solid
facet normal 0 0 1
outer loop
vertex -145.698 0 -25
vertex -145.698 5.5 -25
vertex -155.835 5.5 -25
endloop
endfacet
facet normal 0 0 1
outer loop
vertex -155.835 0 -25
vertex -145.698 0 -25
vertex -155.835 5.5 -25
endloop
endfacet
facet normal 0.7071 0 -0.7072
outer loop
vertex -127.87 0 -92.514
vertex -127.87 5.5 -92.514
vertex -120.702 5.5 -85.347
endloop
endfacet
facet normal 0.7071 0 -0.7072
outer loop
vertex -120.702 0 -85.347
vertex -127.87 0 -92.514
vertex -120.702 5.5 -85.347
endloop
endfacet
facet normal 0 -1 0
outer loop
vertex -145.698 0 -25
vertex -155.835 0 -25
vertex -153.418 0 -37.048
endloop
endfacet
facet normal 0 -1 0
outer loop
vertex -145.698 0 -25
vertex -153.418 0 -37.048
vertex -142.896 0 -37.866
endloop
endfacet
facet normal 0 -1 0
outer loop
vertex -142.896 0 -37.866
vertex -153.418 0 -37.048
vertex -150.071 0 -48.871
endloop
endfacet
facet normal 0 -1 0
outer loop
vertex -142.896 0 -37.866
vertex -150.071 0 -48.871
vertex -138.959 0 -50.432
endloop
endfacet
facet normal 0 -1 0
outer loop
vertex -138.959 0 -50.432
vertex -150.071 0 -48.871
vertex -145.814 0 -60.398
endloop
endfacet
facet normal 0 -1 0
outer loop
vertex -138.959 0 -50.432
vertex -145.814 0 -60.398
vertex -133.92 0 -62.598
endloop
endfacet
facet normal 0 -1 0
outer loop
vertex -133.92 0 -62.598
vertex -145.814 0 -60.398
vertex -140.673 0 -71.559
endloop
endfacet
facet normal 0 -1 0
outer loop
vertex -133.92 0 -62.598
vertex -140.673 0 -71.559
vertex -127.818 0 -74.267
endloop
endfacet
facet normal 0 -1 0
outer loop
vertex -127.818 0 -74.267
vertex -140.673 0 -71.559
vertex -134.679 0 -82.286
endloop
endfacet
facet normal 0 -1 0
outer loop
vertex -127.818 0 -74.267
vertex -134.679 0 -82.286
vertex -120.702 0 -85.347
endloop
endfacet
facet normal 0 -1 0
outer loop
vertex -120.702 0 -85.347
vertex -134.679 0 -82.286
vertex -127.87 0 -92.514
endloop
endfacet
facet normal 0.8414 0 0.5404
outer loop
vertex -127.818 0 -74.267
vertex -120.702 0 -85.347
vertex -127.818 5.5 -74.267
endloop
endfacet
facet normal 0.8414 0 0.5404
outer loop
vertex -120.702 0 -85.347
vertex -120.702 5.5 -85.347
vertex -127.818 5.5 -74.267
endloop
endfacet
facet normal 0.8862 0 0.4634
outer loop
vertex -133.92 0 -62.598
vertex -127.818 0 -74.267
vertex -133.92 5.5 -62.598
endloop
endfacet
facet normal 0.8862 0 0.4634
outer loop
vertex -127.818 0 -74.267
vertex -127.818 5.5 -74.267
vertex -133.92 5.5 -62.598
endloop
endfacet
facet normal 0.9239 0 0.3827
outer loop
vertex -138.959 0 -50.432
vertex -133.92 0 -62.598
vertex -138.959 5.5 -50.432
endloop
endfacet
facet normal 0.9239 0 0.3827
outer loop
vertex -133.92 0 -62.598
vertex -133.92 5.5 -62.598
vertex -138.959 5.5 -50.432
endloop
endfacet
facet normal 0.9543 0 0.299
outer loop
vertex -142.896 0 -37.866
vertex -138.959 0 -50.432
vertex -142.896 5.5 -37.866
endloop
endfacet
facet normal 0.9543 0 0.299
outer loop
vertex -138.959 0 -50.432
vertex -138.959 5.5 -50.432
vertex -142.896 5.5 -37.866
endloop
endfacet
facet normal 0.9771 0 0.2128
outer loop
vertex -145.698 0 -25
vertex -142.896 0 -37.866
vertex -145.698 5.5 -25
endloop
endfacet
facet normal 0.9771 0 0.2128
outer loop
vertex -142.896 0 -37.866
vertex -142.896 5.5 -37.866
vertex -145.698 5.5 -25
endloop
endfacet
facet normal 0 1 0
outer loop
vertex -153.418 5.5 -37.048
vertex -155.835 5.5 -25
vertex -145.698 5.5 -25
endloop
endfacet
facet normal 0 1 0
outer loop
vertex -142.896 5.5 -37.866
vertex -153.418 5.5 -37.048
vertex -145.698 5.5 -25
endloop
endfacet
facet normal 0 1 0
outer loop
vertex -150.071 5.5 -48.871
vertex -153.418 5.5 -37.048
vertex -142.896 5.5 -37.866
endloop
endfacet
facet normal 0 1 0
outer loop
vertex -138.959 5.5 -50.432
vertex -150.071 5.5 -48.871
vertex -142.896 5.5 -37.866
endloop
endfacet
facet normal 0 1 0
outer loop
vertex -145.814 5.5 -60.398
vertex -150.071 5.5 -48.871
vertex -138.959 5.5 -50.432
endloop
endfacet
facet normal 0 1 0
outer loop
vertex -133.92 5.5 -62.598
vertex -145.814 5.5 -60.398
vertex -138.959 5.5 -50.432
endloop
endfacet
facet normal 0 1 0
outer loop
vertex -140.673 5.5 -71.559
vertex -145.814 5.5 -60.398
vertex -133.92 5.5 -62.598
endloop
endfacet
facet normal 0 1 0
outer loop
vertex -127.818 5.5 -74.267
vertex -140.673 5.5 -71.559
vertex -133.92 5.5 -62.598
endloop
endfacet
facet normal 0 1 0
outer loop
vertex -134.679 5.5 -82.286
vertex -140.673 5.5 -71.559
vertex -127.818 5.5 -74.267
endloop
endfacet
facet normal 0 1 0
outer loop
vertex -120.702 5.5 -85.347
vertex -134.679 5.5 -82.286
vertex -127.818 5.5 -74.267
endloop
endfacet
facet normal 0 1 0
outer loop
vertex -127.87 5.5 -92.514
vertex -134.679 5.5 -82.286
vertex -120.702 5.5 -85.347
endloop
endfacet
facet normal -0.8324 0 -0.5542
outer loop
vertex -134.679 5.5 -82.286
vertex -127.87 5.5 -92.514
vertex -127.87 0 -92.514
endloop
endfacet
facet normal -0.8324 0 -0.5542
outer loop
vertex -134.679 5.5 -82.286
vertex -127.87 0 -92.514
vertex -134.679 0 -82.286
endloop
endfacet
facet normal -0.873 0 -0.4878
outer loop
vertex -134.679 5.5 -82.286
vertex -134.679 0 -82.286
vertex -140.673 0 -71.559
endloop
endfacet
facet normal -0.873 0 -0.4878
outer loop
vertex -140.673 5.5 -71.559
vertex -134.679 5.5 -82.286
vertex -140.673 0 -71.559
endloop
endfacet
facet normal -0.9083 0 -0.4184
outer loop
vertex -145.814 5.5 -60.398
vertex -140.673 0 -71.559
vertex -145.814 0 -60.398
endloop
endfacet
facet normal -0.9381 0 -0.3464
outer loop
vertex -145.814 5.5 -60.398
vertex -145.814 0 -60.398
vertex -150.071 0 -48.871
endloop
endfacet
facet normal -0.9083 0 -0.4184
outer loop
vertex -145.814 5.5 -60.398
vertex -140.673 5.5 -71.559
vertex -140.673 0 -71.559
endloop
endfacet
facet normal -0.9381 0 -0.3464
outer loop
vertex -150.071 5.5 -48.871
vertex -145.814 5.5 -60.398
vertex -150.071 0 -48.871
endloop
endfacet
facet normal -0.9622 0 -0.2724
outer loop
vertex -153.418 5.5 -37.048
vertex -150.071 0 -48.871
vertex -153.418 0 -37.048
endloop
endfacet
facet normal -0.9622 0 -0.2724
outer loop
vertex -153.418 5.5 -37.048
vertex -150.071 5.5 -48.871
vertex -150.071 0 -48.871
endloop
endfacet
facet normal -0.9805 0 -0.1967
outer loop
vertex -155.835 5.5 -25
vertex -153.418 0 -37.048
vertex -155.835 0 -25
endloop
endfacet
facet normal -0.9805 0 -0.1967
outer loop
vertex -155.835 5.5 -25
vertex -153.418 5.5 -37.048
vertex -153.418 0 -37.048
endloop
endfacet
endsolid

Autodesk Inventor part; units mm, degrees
ref_plane "YZ Plane" through (0, 0, 0) normal (1, 0, 0) x (0, 1, 0)
ref_plane "XZ Plane" through (0, 0, 0) normal (0, 1, 0) x (-1, 0, 0)
ref_plane "XY Plane" through (0, 0, 0) normal (0, 0, 1) x (1, 0, 0)
sketch "スケッチ1" plane through (0, 0, 0) normal (0, 1, 0) x (-1, 0, 0)
  circle A0 centre (0, 0) radius 178.1675
  circle A1 centre (0, 0) radius 157.8276
  line L0 (168.1877, 0) -> (166.7488, -21.9529)
  line L1 (168.1877, 0) -> (130.1721, 2.4917) construction
  line L2 (249.4344, 0) -> (-249.4344, 0) projected
  line L3 (166.7488, -21.9529) -> (156.7702, -21.2989)
  line L4 (156.7702, -21.2989) -> (158.2091, 0.654) construction
  line L5 (158.2091, 0.654) -> (168.1877, 0)
  line L6 (157.4896, -10.3224) -> (0, 0)
  line L7 (166.7488, -21.9529) -> (162.4568, -43.5302)
  line L8 (162.4568, -43.5302) -> (152.649, -41.5793) construction
  line L9 (152.649, -41.5793) -> (156.9409, -20.002) construction
  line L10 (156.9409, -20.002) -> (166.7488, -21.9529) construction
  line L11 (162.4568, -43.5302) -> (155.3851, -64.3626)
  line L12 (155.3851, -64.3626) -> (145.9158, -61.1482) construction
  line L13 (145.9158, -61.1482) -> (152.9875, -40.3158) construction
  line L14 (152.9875, -40.3158) -> (162.4568, -43.5302) construction
  line L15 (155.3851, -64.3626) -> (145.6548, -84.0938)
  line L16 (145.6548, -84.0938) -> (136.6861, -79.6709) construction
  line L17 (136.6861, -79.6709) -> (146.4164, -59.9397) construction
  line L18 (146.4164, -59.9397) -> (155.3851, -64.3626) construction
  line L19 (0, 0) -> (111.6009, -111.6009)
  line L20 (145.6548, -84.0938) -> (137.3401, -78.5381) construction
  line L21 (137.3401, -78.5381) -> (125.1176, -96.8305) construction
  line L22 (125.1176, -96.8305) -> (133.4323, -102.3862) construction
  line L23 (133.4323, -102.3862) -> (145.6548, -84.0938)
  line L24 (133.4323, -102.3862) -> (125.9139, -95.7927) construction
  line L25 (125.9139, -95.7927) -> (111.4082, -112.3332) construction
  line L26 (111.4082, -112.3332) -> (118.9266, -118.9266)
  line L27 (118.9266, -118.9266) -> (133.4323, -102.3862)
  line L28 (111.6009, -111.6009) -> (118.9266, -118.9266)
  line L29 (166.7488, -21.9529) -> (176.7274, -22.6069) construction
  line L30 (118.9266, -118.9266) -> (125.9834, -125.9834)
  point P0 (154.795, -30.7906)
  point P1 (149.4517, -50.732)
  point P2 (141.5512, -69.8053)
  point P3 (131.2288, -87.6843)
  point P4 (118.661, -104.0629)
  point P5 (157.8276, 0)
  point P6 (178.1675, 0)
  dimension "d0" = 22
  dimension "d1" = 10
  dimension "d2" = 45
  dimension "d4" = 315.6551
extrude "押し出し1" add sketch "スケッチ1" along normal blind 5.5 contours L30 L27 L23 L15 L11 L7 L0 L2 A0 | L28 A1 L2 L0 L7 L11 L15 L23 L27
sketch "スケッチ2" plane through (0, 5.5, 0) normal (0, 1, 0) x (1, 0, 0)
  circle A0 centre (0, 0) radius 309.8276
  line L0 (-168.1877, 0) -> (-166.7488, 21.9529) projected
  line L1 (-166.7488, 21.9529) -> (-162.4568, 43.5302) projected
  line L2 (-162.4568, 43.5302) -> (-155.3851, 64.3626) projected
  line L3 (-155.3851, 64.3626) -> (-145.6548, 84.0938) projected
  line L4 (-133.4323, 102.3862) -> (-145.6548, 84.0938) projected
  line L5 (-118.9266, 118.9266) -> (-133.4323, 102.3862) projected
  line L6 (-167.4682, 10.9764) -> (-166.0294, 32.9293)
  line L7 (-166.0294, 32.9293) -> (-275.7938, 40.1237)
  line L8 (-275.7938, 40.1237) -> (-277.2327, 18.1708)
  line L9 (-277.2327, 18.1708) -> (-167.4682, 10.9764)
  line L10 (-164.6028, 32.7415) -> (-160.3108, 54.3188)
  line L11 (-160.3108, 54.3188) -> (-268.1972, 75.7787)
  line L12 (-268.1972, 75.7787) -> (-272.4892, 54.2015)
  line L13 (-272.4892, 54.2015) -> (-164.6028, 32.7415)
  circle A1 centre (-166.7488, 21.9529) radius 11
  circle A2 centre (-162.4568, 43.5302) radius 11
  line L14 (-158.921, 53.9464) -> (-151.8493, 74.7789)
  line L15 (-151.8493, 74.7789) -> (-256.0116, 110.1372)
  line L16 (-256.0116, 110.1372) -> (-263.0833, 89.3047)
  line L17 (-263.0833, 89.3047) -> (-158.921, 53.9464)
  circle A3 centre (-155.3851, 64.3626) radius 11
  arc A4 (-275.7591, 62.4834) -> (-281.3553, 41.7349) centre (-166.7488, 21.9529) ccw
  line L18 (-178.1663, 0.654) -> (-158.2091, -0.654)
  line L19 (-158.2091, -0.654) -> (-156.7702, 21.2989)
  line L20 (-156.7702, 21.2989) -> (-176.7274, 22.6069)
  line L21 (-176.7274, 22.6069) -> (-178.1663, 0.654)
  line L22 (-177.4468, 11.6305) -> (-275.7938, 40.1237)
  line L23 (-176.7274, 22.6069) -> (-176.008, 33.5834)
  line L24 (-176.008, 33.5834) -> (-275.7591, 62.4834)
  line L25 (-275.7938, 40.1237) -> (-281.3553, 41.7349)
  circle A5 centre (0, 0) radius 137.8276
  line L26 (0, 0) -> (-219.0812, 219.0812)
  line L27 (-111.6009, 111.6009) -> (-125.9834, 125.9834) projected
  line L28 (-433.7586, 0) -> (433.7586, 0) projected
  circle A6 centre (0, 0) radius 279.8276 construction
  arc A7 (-111.6009, 111.6009) -> (-157.8276, 0) centre (0, 0) ccw projected
  point P0 (-158.1662, 0)
  point P1 (-137.8276, 0)
  point P2 (-97.4588, 97.4588)
  point P3 (-309.8276, 0)
  dimension "d7" = 22
  dimension "d10" = 20
  dimension "d11" = 100
  dimension "d12" = 30
  dimension "d14" = 20
  dimension "d17" = 122
extrude "押し出し2" add sketch "スケッチ2" against normal blind 5.5 contours L26 L5 L4 L3 A3 L15 L16 L17 A2 L11 L12 L24 A4 L25 L8 L9 L21 L18 L28 A0 | L18 L21 L9 L0 | L0 A1 L19 L28 | A5 L28 A7 A1 A2 A3 L26 | L26 A7 A3 L3 L4 L5 | A1 L21 L20 L0 | L9 L21 A1 | L0 L20 L19 A1 | L19 A7 L28 | L6 A1 L1 | L20 L23 A1 L6 | L1 A1 A7 L19 L20 | L22 L7 L23 A1 L21 | L9 L8 L22 | A1 L23 L21 | A1 A7 L19 | A7 A3 L2 L3 | A3 A7 | A2 L10 L1 | A1 L7 L24 L13 | A2 A7 A1 | L13 L24 L12 L11 A2 | L1 L2 A2 A7 | A1 L23 L7 | L25 A4 L24 L12 L13 L7 | A7 A1 | A7 A2 A3 | L3 L14 A3 | L10 A2 L2 | L13 L12 L24 | A7 A2 | A3 L14 L2 | L17 L16 L15 A3
sketch "スケッチ3" plane through (0, 5.5, 0) normal (0, 1, 0) x (1, 0, 0)
  circle A0 centre (0, 0) radius 157.8276
  arc A1 (-97.4588, 97.4588) -> (-137.8276, 0) centre (0, 0) ccw projected
  line L0 (-97.4588, 97.4588) -> (-219.0812, 219.0812) projected
  line L1 (-309.8276, 0) -> (-137.8276, 0) projected
  arc A2 (-219.0812, 219.0812) -> (-309.8276, 0) centre (0, 0) ccw projected
  point P0 (-157.8276, 0)
  point P1 (-111.6009, 111.6009)
  dimension "d18" = 20
extrude "押し出し3" cut sketch "スケッチ3" against normal through all contours A0 L1 A2 L0
sketch "スケッチ4" plane through (0, 5.5, 0) normal (0, 1, 0) x (1, 0, 0)
  arc A0 (-111.6009, 111.6009) -> (-157.8276, 0) centre (0, 0) ccw projected
  line L0 (-157.8276, 0) -> (-137.8276, 0)
  line L1 (-137.8276, 0) -> (-137.8276, 25)
  line L2 (-137.8276, 25) -> (-157.8276, 25)
  line L3 (-157.8276, 25) -> (-157.8276, 0)
  arc A1 (-97.4588, 97.4588) -> (-137.8276, 0) centre (0, 0) ccw projected
  line L4 (-97.4588, 97.4588) -> (-111.6009, 111.6009)
  line L5 (-111.6009, 111.6009) -> (-129.2786, 93.9233)
  line L6 (-129.2786, 93.9233) -> (-115.1365, 79.7811)
  line L7 (-115.1365, 79.7811) -> (-97.4588, 97.4588)
  dimension "d21" = 25
  dimension "d22" = 25
extrude "押し出し4" cut sketch "スケッチ4" against normal through all contours L4 L7 L6 A0 | A0 L6 L5 | L2 L1 L0 A0 | A0 L3 L2
fillet "フィレット1" radius 1 2 edges at (-97.4588, 2.75, -97.4588) (-137.8276, 2.75, 0)
sketch "スケッチ5" plane through (0, 5.5, 0) normal (0, 1, 0) x (1, 0, 0)
  circle A0 centre (0, 0) radius 147.8276
  arc A1 (-127.8696, 92.5143) -> (-155.835, 25) centre (0, 0) ccw projected
  arc A2 (-137.8276, 23.48) -> (-135.842, 23.3109) centre (-136.8276, 23.48) ccw projected
  arc A3 (-112.5381, 79.5715) -> (-135.842, 23.3109) centre (0, 0) ccw projected
  arc A4 (-112.5381, 79.5715) -> (-114.0617, 80.8559) centre (-113.3546, 80.1488) ccw projected
  line L0 (-114.0617, 80.8559) -> (-115.1365, 79.7811) projected
  line L1 (-115.1365, 79.7811) -> (-127.8696, 92.5143) projected
  arc A5 (-127.8696, 92.5143) -> (-155.835, 25) centre (0, 0) ccw projected
  line L2 (-155.835, 25) -> (-137.8276, 25) projected
  line L3 (-137.8276, 25) -> (-137.8276, 23.48) projected
  point P0 (-120.7019, 85.3466)
  point P1 (-145.6983, 25)
  dimension "d26" = 10
extrude "押し出し5" cut sketch "スケッチ5" against normal through all contours L1 L0 A4 A3 A2 L3 L2 A0 picked at (-137.0003, 45.2919)
equation "\"d22\" = d21"
properties part number "back_upper" material "木材 (カエデ材)"
